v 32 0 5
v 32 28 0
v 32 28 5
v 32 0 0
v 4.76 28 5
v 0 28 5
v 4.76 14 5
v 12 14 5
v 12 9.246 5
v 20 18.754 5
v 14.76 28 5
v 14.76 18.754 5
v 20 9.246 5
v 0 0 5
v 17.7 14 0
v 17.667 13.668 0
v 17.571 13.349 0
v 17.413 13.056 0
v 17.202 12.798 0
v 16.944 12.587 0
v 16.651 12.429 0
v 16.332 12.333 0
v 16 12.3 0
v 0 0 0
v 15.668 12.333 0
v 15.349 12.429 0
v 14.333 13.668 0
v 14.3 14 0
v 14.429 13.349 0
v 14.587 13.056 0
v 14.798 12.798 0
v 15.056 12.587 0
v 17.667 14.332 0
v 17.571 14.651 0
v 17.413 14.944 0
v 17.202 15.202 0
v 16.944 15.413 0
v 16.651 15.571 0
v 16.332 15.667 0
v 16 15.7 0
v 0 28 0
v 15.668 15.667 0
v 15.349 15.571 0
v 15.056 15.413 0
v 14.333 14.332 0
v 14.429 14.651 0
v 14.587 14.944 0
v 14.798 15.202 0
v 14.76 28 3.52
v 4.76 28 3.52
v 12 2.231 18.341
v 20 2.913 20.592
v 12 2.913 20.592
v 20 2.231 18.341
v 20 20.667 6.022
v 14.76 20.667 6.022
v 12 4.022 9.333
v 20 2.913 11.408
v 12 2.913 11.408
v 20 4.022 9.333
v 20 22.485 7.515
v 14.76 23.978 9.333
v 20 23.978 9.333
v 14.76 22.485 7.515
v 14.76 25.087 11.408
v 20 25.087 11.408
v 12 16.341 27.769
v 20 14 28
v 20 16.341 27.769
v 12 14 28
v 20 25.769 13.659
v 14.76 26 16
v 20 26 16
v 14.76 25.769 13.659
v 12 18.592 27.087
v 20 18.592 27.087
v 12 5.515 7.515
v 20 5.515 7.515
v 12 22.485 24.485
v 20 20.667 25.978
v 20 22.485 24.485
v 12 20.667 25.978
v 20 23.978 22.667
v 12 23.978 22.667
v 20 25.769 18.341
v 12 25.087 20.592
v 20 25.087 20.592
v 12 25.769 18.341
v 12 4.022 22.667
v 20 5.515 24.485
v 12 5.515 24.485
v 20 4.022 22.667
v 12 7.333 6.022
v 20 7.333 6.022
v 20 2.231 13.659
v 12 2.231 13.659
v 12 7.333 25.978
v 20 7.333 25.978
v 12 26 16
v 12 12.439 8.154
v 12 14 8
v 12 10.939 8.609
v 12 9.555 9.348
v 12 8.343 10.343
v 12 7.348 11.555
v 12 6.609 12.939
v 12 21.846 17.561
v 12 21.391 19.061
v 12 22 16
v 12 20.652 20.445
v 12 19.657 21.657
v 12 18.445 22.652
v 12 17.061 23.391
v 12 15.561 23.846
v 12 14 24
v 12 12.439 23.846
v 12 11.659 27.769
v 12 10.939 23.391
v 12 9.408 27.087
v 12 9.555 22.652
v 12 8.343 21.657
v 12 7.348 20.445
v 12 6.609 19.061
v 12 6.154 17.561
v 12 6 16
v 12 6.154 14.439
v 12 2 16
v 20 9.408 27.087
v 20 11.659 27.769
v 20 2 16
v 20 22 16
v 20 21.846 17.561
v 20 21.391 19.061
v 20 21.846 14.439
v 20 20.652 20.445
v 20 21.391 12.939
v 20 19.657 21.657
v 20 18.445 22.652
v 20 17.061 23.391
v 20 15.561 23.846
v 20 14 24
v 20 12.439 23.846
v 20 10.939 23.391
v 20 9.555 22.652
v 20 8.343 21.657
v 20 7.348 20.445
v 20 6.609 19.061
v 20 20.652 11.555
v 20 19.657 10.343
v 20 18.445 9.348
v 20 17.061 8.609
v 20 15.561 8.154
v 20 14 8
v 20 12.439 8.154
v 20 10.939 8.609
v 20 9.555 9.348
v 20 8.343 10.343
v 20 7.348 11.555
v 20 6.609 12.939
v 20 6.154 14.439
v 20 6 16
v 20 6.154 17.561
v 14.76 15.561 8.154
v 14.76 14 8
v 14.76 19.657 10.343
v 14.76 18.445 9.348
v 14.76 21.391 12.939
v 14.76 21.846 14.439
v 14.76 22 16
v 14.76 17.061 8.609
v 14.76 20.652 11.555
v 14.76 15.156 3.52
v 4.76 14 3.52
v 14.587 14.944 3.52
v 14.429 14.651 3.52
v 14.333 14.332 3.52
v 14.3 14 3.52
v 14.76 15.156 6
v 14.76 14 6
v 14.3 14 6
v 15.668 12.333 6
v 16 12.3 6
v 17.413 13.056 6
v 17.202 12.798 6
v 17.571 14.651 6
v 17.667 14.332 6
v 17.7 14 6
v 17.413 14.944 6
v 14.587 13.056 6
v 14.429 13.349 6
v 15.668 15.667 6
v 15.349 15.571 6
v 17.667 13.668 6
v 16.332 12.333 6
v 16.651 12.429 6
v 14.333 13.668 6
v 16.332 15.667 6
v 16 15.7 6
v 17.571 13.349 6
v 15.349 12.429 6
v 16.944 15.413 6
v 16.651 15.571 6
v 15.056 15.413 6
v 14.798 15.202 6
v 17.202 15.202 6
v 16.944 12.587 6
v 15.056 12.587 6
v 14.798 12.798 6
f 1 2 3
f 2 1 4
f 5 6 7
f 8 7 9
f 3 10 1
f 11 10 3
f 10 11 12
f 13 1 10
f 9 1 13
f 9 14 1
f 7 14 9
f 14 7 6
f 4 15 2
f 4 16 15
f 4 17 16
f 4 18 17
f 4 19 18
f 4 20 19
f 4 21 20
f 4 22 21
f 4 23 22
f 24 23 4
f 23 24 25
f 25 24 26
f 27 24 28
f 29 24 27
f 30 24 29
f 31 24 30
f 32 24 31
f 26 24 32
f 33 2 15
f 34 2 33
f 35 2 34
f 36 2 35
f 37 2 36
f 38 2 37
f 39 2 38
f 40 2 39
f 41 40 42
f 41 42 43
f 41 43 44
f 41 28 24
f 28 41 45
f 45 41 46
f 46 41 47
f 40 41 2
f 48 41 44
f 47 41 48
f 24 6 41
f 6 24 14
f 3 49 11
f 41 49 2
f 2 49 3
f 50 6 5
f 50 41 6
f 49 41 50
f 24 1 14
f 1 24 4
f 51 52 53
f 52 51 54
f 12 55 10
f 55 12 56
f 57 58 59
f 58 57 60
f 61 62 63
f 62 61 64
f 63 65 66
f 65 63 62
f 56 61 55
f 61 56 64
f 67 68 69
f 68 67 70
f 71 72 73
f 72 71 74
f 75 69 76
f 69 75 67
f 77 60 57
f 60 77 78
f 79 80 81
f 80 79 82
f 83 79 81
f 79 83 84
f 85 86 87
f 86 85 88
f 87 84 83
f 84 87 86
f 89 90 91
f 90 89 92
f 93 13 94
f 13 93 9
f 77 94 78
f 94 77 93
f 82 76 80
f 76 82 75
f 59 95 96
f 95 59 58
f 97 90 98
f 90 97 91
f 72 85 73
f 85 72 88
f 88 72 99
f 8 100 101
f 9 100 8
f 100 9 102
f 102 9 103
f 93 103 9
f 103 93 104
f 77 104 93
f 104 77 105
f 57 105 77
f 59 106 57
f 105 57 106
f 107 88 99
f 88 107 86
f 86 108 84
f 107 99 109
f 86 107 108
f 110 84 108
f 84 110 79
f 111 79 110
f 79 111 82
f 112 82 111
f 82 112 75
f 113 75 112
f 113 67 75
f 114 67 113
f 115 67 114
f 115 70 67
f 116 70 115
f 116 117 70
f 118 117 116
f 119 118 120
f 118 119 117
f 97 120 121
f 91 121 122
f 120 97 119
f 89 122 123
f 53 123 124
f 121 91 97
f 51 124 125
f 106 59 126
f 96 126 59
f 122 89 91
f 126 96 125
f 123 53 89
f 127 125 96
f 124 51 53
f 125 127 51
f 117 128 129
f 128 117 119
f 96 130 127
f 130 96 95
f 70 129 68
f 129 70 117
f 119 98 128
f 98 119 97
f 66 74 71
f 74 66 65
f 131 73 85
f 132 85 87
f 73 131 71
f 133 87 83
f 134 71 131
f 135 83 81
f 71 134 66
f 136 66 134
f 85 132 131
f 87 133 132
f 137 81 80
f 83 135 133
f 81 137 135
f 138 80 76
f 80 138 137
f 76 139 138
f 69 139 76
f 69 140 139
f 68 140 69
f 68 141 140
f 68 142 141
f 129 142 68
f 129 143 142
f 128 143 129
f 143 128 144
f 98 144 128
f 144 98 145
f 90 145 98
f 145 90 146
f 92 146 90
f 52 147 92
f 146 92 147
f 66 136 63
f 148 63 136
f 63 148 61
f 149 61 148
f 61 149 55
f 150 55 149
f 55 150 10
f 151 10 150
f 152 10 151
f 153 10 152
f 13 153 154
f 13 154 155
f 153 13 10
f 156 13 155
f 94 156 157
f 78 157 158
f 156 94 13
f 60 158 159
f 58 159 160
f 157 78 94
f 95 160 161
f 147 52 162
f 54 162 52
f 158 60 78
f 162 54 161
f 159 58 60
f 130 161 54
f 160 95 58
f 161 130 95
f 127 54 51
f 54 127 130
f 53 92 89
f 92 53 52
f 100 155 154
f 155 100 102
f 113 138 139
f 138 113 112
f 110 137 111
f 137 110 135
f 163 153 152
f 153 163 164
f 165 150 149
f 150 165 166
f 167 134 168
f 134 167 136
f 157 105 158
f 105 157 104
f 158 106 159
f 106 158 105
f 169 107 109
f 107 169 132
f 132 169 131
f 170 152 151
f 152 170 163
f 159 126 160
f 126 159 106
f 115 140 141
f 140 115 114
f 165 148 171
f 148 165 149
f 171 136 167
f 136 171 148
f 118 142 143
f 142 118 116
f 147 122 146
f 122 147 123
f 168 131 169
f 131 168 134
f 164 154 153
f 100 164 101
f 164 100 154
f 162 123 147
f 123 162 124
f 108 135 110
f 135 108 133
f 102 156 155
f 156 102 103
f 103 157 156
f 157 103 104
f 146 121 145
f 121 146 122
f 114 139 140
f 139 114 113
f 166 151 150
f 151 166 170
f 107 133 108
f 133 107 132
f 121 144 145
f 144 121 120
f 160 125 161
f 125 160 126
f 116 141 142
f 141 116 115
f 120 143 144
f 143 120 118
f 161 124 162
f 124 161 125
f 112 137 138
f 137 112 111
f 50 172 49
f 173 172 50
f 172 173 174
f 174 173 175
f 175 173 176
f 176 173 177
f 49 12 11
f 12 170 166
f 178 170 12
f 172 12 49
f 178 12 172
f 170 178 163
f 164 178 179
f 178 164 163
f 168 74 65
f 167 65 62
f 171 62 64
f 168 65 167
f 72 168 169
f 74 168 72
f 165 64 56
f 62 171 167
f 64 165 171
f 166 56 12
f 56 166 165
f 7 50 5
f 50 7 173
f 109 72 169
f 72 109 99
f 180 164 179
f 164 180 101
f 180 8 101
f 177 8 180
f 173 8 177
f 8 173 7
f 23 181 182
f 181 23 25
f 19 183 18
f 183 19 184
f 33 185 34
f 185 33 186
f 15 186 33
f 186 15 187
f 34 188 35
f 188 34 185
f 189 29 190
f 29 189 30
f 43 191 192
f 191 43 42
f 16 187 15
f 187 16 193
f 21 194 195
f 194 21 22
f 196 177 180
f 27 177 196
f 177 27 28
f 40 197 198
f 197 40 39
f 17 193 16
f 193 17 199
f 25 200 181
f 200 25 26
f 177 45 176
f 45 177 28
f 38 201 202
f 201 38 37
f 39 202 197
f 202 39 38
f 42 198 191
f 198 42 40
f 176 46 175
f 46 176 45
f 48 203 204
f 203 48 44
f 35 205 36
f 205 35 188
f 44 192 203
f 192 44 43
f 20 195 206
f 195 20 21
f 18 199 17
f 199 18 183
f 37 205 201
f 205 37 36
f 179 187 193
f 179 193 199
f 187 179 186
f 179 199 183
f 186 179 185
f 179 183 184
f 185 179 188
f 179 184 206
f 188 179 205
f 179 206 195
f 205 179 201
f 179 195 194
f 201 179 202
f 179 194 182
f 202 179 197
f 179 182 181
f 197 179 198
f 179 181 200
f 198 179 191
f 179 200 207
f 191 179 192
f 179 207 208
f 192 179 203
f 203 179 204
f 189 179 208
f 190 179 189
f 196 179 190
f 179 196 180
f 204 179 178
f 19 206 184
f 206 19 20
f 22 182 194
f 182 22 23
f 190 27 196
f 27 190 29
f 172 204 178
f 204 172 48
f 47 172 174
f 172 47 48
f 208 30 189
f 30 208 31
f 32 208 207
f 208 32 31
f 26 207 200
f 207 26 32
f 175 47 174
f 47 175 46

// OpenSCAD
$fn = 32;

// ----------------------------------------------------------------------
// Cable clip: cable 16 mm, clamp 24 mm, base 32 mm
// ----------------------------------------------------------------------

// --- parameters (mm) ---
plate_x = 32;             // base length, X
plate_y = 28;             // base width, Y
plate_t = 5;              // base thickness
wire_seat_d = 24;         // clamp outside diameter
clip_t = 4;               // clamp wall
cable_d = 16;             // cable opening
ring_w = 8;               // clamp width along the cable
screw_d = 3.4;            // screw clearance
throat = 12.48;           // snap throat width
sink = 1;                 // overlap of the clamp into the base

module base() {
  cube([plate_x, plate_y, plate_t]);
}

module clamp() {
  translate([plate_x / 2, plate_y / 2, plate_t + wire_seat_d / 2 - sink]) rotate([0, 90, 0])
    cylinder(h = ring_w, d = wire_seat_d, center = true);
}

difference() {
  union() {
    base();
    clamp();
  }
  translate([plate_x / 2, plate_y / 2, plate_t + wire_seat_d / 2 - sink]) rotate([0, 90, 0]) translate([0, 0, -ring_w / 2 - 1]) cylinder(h = ring_w + 2, d = cable_d);
  /* snap throat: the opening is narrower than the cable */
  translate([plate_x / 2 - throat / 2, plate_y / 2, plate_t + wire_seat_d / 2 - sink]) rotate([0, 90, 0]) translate([0, 0, -ring_w / 2 - 1]) cube([throat, wire_seat_d + 2, ring_w + 2]);
  translate([16, plate_y / 2, -1]) cylinder(h = plate_t + 2, d = screw_d);
}
